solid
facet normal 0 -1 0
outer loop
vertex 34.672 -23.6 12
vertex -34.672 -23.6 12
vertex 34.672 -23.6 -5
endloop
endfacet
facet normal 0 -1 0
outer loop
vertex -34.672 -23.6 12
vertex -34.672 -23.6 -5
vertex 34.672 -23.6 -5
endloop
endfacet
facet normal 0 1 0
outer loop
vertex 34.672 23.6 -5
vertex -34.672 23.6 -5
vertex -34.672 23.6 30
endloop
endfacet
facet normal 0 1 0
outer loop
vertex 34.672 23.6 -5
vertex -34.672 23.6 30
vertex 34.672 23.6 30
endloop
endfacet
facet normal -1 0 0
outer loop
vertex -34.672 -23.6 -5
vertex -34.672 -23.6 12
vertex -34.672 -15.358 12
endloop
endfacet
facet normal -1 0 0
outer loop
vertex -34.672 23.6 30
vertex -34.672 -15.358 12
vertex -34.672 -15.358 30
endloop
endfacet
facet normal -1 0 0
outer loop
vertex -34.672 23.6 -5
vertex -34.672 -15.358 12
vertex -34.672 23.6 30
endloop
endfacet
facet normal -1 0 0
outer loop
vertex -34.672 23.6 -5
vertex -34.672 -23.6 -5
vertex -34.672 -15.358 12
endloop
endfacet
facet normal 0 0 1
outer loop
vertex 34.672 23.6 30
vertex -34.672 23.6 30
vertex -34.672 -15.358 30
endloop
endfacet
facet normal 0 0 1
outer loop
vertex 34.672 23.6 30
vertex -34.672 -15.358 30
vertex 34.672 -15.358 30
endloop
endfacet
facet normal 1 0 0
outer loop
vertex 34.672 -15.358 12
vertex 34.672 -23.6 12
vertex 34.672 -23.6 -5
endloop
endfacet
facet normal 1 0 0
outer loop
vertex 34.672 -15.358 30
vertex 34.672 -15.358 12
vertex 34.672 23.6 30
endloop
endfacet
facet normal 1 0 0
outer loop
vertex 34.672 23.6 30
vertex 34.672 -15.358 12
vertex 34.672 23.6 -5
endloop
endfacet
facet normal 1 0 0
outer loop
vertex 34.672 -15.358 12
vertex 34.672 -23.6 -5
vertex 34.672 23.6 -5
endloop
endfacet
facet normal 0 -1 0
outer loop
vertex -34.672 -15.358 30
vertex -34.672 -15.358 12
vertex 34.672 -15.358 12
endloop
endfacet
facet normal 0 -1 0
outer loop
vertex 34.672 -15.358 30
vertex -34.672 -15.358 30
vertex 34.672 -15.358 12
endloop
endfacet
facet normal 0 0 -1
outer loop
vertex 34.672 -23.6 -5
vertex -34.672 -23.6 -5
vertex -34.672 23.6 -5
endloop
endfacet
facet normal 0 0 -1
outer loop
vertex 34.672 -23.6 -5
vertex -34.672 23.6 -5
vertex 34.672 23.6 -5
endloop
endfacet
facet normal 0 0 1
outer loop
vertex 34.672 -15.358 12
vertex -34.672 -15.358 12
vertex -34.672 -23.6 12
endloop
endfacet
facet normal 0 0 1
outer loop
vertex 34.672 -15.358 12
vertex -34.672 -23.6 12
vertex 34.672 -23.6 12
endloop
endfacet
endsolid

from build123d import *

# Parameters (mm, degrees)
F0_W      = 69.343508
F0_H      = 47.200218
F1_DEPTH  = 5
F1_FACE_W = 69.343508
F1_FACE_H = 47.200218
F2_DEPTH  = 5
F3_W      = 69.343508
F3_H      = 8.242194
F5_DEPTH  = 7
F4_W      = 69.343508
F4_H      = 38.958024
F6_W      = 69.343508
F6_H      = 38.958024
F7_DEPTH  = 25


with BuildPart() as f1:
    # F0 (on Top) → F1 (new body)
    with BuildSketch(Plane.XY):
        Rectangle(F0_W, F0_H)
    extrude(amount=F1_DEPTH)

    # F1_face (on face) → F2 (join)
    with BuildSketch(Plane(origin=(0, 0, 0), x_dir=(1, 0, 0), z_dir=(0, 0, -1))):
        Rectangle(F1_FACE_W, F1_FACE_H)
    extrude(amount=F2_DEPTH)

    # F3 (on face) → F5 (join)
    with BuildSketch(Plane.XY.offset(5)):
        with Locations((0, -19.479012)):
            Rectangle(F3_W, F3_H)
    extrude(amount=F5_DEPTH)

    # F4 (on face) + F6 (on face) → F7 (join)
    with BuildSketch(Plane.XY.offset(5)):
        with Locations((0, 4.121097)):
            Rectangle(F4_W, F4_H)
    with BuildSketch(Plane.XY.offset(5)):
        with Locations((0, 4.121097)):
            Rectangle(F6_W, F6_H)
    extrude(amount=F7_DEPTH)


solid = f1.part
